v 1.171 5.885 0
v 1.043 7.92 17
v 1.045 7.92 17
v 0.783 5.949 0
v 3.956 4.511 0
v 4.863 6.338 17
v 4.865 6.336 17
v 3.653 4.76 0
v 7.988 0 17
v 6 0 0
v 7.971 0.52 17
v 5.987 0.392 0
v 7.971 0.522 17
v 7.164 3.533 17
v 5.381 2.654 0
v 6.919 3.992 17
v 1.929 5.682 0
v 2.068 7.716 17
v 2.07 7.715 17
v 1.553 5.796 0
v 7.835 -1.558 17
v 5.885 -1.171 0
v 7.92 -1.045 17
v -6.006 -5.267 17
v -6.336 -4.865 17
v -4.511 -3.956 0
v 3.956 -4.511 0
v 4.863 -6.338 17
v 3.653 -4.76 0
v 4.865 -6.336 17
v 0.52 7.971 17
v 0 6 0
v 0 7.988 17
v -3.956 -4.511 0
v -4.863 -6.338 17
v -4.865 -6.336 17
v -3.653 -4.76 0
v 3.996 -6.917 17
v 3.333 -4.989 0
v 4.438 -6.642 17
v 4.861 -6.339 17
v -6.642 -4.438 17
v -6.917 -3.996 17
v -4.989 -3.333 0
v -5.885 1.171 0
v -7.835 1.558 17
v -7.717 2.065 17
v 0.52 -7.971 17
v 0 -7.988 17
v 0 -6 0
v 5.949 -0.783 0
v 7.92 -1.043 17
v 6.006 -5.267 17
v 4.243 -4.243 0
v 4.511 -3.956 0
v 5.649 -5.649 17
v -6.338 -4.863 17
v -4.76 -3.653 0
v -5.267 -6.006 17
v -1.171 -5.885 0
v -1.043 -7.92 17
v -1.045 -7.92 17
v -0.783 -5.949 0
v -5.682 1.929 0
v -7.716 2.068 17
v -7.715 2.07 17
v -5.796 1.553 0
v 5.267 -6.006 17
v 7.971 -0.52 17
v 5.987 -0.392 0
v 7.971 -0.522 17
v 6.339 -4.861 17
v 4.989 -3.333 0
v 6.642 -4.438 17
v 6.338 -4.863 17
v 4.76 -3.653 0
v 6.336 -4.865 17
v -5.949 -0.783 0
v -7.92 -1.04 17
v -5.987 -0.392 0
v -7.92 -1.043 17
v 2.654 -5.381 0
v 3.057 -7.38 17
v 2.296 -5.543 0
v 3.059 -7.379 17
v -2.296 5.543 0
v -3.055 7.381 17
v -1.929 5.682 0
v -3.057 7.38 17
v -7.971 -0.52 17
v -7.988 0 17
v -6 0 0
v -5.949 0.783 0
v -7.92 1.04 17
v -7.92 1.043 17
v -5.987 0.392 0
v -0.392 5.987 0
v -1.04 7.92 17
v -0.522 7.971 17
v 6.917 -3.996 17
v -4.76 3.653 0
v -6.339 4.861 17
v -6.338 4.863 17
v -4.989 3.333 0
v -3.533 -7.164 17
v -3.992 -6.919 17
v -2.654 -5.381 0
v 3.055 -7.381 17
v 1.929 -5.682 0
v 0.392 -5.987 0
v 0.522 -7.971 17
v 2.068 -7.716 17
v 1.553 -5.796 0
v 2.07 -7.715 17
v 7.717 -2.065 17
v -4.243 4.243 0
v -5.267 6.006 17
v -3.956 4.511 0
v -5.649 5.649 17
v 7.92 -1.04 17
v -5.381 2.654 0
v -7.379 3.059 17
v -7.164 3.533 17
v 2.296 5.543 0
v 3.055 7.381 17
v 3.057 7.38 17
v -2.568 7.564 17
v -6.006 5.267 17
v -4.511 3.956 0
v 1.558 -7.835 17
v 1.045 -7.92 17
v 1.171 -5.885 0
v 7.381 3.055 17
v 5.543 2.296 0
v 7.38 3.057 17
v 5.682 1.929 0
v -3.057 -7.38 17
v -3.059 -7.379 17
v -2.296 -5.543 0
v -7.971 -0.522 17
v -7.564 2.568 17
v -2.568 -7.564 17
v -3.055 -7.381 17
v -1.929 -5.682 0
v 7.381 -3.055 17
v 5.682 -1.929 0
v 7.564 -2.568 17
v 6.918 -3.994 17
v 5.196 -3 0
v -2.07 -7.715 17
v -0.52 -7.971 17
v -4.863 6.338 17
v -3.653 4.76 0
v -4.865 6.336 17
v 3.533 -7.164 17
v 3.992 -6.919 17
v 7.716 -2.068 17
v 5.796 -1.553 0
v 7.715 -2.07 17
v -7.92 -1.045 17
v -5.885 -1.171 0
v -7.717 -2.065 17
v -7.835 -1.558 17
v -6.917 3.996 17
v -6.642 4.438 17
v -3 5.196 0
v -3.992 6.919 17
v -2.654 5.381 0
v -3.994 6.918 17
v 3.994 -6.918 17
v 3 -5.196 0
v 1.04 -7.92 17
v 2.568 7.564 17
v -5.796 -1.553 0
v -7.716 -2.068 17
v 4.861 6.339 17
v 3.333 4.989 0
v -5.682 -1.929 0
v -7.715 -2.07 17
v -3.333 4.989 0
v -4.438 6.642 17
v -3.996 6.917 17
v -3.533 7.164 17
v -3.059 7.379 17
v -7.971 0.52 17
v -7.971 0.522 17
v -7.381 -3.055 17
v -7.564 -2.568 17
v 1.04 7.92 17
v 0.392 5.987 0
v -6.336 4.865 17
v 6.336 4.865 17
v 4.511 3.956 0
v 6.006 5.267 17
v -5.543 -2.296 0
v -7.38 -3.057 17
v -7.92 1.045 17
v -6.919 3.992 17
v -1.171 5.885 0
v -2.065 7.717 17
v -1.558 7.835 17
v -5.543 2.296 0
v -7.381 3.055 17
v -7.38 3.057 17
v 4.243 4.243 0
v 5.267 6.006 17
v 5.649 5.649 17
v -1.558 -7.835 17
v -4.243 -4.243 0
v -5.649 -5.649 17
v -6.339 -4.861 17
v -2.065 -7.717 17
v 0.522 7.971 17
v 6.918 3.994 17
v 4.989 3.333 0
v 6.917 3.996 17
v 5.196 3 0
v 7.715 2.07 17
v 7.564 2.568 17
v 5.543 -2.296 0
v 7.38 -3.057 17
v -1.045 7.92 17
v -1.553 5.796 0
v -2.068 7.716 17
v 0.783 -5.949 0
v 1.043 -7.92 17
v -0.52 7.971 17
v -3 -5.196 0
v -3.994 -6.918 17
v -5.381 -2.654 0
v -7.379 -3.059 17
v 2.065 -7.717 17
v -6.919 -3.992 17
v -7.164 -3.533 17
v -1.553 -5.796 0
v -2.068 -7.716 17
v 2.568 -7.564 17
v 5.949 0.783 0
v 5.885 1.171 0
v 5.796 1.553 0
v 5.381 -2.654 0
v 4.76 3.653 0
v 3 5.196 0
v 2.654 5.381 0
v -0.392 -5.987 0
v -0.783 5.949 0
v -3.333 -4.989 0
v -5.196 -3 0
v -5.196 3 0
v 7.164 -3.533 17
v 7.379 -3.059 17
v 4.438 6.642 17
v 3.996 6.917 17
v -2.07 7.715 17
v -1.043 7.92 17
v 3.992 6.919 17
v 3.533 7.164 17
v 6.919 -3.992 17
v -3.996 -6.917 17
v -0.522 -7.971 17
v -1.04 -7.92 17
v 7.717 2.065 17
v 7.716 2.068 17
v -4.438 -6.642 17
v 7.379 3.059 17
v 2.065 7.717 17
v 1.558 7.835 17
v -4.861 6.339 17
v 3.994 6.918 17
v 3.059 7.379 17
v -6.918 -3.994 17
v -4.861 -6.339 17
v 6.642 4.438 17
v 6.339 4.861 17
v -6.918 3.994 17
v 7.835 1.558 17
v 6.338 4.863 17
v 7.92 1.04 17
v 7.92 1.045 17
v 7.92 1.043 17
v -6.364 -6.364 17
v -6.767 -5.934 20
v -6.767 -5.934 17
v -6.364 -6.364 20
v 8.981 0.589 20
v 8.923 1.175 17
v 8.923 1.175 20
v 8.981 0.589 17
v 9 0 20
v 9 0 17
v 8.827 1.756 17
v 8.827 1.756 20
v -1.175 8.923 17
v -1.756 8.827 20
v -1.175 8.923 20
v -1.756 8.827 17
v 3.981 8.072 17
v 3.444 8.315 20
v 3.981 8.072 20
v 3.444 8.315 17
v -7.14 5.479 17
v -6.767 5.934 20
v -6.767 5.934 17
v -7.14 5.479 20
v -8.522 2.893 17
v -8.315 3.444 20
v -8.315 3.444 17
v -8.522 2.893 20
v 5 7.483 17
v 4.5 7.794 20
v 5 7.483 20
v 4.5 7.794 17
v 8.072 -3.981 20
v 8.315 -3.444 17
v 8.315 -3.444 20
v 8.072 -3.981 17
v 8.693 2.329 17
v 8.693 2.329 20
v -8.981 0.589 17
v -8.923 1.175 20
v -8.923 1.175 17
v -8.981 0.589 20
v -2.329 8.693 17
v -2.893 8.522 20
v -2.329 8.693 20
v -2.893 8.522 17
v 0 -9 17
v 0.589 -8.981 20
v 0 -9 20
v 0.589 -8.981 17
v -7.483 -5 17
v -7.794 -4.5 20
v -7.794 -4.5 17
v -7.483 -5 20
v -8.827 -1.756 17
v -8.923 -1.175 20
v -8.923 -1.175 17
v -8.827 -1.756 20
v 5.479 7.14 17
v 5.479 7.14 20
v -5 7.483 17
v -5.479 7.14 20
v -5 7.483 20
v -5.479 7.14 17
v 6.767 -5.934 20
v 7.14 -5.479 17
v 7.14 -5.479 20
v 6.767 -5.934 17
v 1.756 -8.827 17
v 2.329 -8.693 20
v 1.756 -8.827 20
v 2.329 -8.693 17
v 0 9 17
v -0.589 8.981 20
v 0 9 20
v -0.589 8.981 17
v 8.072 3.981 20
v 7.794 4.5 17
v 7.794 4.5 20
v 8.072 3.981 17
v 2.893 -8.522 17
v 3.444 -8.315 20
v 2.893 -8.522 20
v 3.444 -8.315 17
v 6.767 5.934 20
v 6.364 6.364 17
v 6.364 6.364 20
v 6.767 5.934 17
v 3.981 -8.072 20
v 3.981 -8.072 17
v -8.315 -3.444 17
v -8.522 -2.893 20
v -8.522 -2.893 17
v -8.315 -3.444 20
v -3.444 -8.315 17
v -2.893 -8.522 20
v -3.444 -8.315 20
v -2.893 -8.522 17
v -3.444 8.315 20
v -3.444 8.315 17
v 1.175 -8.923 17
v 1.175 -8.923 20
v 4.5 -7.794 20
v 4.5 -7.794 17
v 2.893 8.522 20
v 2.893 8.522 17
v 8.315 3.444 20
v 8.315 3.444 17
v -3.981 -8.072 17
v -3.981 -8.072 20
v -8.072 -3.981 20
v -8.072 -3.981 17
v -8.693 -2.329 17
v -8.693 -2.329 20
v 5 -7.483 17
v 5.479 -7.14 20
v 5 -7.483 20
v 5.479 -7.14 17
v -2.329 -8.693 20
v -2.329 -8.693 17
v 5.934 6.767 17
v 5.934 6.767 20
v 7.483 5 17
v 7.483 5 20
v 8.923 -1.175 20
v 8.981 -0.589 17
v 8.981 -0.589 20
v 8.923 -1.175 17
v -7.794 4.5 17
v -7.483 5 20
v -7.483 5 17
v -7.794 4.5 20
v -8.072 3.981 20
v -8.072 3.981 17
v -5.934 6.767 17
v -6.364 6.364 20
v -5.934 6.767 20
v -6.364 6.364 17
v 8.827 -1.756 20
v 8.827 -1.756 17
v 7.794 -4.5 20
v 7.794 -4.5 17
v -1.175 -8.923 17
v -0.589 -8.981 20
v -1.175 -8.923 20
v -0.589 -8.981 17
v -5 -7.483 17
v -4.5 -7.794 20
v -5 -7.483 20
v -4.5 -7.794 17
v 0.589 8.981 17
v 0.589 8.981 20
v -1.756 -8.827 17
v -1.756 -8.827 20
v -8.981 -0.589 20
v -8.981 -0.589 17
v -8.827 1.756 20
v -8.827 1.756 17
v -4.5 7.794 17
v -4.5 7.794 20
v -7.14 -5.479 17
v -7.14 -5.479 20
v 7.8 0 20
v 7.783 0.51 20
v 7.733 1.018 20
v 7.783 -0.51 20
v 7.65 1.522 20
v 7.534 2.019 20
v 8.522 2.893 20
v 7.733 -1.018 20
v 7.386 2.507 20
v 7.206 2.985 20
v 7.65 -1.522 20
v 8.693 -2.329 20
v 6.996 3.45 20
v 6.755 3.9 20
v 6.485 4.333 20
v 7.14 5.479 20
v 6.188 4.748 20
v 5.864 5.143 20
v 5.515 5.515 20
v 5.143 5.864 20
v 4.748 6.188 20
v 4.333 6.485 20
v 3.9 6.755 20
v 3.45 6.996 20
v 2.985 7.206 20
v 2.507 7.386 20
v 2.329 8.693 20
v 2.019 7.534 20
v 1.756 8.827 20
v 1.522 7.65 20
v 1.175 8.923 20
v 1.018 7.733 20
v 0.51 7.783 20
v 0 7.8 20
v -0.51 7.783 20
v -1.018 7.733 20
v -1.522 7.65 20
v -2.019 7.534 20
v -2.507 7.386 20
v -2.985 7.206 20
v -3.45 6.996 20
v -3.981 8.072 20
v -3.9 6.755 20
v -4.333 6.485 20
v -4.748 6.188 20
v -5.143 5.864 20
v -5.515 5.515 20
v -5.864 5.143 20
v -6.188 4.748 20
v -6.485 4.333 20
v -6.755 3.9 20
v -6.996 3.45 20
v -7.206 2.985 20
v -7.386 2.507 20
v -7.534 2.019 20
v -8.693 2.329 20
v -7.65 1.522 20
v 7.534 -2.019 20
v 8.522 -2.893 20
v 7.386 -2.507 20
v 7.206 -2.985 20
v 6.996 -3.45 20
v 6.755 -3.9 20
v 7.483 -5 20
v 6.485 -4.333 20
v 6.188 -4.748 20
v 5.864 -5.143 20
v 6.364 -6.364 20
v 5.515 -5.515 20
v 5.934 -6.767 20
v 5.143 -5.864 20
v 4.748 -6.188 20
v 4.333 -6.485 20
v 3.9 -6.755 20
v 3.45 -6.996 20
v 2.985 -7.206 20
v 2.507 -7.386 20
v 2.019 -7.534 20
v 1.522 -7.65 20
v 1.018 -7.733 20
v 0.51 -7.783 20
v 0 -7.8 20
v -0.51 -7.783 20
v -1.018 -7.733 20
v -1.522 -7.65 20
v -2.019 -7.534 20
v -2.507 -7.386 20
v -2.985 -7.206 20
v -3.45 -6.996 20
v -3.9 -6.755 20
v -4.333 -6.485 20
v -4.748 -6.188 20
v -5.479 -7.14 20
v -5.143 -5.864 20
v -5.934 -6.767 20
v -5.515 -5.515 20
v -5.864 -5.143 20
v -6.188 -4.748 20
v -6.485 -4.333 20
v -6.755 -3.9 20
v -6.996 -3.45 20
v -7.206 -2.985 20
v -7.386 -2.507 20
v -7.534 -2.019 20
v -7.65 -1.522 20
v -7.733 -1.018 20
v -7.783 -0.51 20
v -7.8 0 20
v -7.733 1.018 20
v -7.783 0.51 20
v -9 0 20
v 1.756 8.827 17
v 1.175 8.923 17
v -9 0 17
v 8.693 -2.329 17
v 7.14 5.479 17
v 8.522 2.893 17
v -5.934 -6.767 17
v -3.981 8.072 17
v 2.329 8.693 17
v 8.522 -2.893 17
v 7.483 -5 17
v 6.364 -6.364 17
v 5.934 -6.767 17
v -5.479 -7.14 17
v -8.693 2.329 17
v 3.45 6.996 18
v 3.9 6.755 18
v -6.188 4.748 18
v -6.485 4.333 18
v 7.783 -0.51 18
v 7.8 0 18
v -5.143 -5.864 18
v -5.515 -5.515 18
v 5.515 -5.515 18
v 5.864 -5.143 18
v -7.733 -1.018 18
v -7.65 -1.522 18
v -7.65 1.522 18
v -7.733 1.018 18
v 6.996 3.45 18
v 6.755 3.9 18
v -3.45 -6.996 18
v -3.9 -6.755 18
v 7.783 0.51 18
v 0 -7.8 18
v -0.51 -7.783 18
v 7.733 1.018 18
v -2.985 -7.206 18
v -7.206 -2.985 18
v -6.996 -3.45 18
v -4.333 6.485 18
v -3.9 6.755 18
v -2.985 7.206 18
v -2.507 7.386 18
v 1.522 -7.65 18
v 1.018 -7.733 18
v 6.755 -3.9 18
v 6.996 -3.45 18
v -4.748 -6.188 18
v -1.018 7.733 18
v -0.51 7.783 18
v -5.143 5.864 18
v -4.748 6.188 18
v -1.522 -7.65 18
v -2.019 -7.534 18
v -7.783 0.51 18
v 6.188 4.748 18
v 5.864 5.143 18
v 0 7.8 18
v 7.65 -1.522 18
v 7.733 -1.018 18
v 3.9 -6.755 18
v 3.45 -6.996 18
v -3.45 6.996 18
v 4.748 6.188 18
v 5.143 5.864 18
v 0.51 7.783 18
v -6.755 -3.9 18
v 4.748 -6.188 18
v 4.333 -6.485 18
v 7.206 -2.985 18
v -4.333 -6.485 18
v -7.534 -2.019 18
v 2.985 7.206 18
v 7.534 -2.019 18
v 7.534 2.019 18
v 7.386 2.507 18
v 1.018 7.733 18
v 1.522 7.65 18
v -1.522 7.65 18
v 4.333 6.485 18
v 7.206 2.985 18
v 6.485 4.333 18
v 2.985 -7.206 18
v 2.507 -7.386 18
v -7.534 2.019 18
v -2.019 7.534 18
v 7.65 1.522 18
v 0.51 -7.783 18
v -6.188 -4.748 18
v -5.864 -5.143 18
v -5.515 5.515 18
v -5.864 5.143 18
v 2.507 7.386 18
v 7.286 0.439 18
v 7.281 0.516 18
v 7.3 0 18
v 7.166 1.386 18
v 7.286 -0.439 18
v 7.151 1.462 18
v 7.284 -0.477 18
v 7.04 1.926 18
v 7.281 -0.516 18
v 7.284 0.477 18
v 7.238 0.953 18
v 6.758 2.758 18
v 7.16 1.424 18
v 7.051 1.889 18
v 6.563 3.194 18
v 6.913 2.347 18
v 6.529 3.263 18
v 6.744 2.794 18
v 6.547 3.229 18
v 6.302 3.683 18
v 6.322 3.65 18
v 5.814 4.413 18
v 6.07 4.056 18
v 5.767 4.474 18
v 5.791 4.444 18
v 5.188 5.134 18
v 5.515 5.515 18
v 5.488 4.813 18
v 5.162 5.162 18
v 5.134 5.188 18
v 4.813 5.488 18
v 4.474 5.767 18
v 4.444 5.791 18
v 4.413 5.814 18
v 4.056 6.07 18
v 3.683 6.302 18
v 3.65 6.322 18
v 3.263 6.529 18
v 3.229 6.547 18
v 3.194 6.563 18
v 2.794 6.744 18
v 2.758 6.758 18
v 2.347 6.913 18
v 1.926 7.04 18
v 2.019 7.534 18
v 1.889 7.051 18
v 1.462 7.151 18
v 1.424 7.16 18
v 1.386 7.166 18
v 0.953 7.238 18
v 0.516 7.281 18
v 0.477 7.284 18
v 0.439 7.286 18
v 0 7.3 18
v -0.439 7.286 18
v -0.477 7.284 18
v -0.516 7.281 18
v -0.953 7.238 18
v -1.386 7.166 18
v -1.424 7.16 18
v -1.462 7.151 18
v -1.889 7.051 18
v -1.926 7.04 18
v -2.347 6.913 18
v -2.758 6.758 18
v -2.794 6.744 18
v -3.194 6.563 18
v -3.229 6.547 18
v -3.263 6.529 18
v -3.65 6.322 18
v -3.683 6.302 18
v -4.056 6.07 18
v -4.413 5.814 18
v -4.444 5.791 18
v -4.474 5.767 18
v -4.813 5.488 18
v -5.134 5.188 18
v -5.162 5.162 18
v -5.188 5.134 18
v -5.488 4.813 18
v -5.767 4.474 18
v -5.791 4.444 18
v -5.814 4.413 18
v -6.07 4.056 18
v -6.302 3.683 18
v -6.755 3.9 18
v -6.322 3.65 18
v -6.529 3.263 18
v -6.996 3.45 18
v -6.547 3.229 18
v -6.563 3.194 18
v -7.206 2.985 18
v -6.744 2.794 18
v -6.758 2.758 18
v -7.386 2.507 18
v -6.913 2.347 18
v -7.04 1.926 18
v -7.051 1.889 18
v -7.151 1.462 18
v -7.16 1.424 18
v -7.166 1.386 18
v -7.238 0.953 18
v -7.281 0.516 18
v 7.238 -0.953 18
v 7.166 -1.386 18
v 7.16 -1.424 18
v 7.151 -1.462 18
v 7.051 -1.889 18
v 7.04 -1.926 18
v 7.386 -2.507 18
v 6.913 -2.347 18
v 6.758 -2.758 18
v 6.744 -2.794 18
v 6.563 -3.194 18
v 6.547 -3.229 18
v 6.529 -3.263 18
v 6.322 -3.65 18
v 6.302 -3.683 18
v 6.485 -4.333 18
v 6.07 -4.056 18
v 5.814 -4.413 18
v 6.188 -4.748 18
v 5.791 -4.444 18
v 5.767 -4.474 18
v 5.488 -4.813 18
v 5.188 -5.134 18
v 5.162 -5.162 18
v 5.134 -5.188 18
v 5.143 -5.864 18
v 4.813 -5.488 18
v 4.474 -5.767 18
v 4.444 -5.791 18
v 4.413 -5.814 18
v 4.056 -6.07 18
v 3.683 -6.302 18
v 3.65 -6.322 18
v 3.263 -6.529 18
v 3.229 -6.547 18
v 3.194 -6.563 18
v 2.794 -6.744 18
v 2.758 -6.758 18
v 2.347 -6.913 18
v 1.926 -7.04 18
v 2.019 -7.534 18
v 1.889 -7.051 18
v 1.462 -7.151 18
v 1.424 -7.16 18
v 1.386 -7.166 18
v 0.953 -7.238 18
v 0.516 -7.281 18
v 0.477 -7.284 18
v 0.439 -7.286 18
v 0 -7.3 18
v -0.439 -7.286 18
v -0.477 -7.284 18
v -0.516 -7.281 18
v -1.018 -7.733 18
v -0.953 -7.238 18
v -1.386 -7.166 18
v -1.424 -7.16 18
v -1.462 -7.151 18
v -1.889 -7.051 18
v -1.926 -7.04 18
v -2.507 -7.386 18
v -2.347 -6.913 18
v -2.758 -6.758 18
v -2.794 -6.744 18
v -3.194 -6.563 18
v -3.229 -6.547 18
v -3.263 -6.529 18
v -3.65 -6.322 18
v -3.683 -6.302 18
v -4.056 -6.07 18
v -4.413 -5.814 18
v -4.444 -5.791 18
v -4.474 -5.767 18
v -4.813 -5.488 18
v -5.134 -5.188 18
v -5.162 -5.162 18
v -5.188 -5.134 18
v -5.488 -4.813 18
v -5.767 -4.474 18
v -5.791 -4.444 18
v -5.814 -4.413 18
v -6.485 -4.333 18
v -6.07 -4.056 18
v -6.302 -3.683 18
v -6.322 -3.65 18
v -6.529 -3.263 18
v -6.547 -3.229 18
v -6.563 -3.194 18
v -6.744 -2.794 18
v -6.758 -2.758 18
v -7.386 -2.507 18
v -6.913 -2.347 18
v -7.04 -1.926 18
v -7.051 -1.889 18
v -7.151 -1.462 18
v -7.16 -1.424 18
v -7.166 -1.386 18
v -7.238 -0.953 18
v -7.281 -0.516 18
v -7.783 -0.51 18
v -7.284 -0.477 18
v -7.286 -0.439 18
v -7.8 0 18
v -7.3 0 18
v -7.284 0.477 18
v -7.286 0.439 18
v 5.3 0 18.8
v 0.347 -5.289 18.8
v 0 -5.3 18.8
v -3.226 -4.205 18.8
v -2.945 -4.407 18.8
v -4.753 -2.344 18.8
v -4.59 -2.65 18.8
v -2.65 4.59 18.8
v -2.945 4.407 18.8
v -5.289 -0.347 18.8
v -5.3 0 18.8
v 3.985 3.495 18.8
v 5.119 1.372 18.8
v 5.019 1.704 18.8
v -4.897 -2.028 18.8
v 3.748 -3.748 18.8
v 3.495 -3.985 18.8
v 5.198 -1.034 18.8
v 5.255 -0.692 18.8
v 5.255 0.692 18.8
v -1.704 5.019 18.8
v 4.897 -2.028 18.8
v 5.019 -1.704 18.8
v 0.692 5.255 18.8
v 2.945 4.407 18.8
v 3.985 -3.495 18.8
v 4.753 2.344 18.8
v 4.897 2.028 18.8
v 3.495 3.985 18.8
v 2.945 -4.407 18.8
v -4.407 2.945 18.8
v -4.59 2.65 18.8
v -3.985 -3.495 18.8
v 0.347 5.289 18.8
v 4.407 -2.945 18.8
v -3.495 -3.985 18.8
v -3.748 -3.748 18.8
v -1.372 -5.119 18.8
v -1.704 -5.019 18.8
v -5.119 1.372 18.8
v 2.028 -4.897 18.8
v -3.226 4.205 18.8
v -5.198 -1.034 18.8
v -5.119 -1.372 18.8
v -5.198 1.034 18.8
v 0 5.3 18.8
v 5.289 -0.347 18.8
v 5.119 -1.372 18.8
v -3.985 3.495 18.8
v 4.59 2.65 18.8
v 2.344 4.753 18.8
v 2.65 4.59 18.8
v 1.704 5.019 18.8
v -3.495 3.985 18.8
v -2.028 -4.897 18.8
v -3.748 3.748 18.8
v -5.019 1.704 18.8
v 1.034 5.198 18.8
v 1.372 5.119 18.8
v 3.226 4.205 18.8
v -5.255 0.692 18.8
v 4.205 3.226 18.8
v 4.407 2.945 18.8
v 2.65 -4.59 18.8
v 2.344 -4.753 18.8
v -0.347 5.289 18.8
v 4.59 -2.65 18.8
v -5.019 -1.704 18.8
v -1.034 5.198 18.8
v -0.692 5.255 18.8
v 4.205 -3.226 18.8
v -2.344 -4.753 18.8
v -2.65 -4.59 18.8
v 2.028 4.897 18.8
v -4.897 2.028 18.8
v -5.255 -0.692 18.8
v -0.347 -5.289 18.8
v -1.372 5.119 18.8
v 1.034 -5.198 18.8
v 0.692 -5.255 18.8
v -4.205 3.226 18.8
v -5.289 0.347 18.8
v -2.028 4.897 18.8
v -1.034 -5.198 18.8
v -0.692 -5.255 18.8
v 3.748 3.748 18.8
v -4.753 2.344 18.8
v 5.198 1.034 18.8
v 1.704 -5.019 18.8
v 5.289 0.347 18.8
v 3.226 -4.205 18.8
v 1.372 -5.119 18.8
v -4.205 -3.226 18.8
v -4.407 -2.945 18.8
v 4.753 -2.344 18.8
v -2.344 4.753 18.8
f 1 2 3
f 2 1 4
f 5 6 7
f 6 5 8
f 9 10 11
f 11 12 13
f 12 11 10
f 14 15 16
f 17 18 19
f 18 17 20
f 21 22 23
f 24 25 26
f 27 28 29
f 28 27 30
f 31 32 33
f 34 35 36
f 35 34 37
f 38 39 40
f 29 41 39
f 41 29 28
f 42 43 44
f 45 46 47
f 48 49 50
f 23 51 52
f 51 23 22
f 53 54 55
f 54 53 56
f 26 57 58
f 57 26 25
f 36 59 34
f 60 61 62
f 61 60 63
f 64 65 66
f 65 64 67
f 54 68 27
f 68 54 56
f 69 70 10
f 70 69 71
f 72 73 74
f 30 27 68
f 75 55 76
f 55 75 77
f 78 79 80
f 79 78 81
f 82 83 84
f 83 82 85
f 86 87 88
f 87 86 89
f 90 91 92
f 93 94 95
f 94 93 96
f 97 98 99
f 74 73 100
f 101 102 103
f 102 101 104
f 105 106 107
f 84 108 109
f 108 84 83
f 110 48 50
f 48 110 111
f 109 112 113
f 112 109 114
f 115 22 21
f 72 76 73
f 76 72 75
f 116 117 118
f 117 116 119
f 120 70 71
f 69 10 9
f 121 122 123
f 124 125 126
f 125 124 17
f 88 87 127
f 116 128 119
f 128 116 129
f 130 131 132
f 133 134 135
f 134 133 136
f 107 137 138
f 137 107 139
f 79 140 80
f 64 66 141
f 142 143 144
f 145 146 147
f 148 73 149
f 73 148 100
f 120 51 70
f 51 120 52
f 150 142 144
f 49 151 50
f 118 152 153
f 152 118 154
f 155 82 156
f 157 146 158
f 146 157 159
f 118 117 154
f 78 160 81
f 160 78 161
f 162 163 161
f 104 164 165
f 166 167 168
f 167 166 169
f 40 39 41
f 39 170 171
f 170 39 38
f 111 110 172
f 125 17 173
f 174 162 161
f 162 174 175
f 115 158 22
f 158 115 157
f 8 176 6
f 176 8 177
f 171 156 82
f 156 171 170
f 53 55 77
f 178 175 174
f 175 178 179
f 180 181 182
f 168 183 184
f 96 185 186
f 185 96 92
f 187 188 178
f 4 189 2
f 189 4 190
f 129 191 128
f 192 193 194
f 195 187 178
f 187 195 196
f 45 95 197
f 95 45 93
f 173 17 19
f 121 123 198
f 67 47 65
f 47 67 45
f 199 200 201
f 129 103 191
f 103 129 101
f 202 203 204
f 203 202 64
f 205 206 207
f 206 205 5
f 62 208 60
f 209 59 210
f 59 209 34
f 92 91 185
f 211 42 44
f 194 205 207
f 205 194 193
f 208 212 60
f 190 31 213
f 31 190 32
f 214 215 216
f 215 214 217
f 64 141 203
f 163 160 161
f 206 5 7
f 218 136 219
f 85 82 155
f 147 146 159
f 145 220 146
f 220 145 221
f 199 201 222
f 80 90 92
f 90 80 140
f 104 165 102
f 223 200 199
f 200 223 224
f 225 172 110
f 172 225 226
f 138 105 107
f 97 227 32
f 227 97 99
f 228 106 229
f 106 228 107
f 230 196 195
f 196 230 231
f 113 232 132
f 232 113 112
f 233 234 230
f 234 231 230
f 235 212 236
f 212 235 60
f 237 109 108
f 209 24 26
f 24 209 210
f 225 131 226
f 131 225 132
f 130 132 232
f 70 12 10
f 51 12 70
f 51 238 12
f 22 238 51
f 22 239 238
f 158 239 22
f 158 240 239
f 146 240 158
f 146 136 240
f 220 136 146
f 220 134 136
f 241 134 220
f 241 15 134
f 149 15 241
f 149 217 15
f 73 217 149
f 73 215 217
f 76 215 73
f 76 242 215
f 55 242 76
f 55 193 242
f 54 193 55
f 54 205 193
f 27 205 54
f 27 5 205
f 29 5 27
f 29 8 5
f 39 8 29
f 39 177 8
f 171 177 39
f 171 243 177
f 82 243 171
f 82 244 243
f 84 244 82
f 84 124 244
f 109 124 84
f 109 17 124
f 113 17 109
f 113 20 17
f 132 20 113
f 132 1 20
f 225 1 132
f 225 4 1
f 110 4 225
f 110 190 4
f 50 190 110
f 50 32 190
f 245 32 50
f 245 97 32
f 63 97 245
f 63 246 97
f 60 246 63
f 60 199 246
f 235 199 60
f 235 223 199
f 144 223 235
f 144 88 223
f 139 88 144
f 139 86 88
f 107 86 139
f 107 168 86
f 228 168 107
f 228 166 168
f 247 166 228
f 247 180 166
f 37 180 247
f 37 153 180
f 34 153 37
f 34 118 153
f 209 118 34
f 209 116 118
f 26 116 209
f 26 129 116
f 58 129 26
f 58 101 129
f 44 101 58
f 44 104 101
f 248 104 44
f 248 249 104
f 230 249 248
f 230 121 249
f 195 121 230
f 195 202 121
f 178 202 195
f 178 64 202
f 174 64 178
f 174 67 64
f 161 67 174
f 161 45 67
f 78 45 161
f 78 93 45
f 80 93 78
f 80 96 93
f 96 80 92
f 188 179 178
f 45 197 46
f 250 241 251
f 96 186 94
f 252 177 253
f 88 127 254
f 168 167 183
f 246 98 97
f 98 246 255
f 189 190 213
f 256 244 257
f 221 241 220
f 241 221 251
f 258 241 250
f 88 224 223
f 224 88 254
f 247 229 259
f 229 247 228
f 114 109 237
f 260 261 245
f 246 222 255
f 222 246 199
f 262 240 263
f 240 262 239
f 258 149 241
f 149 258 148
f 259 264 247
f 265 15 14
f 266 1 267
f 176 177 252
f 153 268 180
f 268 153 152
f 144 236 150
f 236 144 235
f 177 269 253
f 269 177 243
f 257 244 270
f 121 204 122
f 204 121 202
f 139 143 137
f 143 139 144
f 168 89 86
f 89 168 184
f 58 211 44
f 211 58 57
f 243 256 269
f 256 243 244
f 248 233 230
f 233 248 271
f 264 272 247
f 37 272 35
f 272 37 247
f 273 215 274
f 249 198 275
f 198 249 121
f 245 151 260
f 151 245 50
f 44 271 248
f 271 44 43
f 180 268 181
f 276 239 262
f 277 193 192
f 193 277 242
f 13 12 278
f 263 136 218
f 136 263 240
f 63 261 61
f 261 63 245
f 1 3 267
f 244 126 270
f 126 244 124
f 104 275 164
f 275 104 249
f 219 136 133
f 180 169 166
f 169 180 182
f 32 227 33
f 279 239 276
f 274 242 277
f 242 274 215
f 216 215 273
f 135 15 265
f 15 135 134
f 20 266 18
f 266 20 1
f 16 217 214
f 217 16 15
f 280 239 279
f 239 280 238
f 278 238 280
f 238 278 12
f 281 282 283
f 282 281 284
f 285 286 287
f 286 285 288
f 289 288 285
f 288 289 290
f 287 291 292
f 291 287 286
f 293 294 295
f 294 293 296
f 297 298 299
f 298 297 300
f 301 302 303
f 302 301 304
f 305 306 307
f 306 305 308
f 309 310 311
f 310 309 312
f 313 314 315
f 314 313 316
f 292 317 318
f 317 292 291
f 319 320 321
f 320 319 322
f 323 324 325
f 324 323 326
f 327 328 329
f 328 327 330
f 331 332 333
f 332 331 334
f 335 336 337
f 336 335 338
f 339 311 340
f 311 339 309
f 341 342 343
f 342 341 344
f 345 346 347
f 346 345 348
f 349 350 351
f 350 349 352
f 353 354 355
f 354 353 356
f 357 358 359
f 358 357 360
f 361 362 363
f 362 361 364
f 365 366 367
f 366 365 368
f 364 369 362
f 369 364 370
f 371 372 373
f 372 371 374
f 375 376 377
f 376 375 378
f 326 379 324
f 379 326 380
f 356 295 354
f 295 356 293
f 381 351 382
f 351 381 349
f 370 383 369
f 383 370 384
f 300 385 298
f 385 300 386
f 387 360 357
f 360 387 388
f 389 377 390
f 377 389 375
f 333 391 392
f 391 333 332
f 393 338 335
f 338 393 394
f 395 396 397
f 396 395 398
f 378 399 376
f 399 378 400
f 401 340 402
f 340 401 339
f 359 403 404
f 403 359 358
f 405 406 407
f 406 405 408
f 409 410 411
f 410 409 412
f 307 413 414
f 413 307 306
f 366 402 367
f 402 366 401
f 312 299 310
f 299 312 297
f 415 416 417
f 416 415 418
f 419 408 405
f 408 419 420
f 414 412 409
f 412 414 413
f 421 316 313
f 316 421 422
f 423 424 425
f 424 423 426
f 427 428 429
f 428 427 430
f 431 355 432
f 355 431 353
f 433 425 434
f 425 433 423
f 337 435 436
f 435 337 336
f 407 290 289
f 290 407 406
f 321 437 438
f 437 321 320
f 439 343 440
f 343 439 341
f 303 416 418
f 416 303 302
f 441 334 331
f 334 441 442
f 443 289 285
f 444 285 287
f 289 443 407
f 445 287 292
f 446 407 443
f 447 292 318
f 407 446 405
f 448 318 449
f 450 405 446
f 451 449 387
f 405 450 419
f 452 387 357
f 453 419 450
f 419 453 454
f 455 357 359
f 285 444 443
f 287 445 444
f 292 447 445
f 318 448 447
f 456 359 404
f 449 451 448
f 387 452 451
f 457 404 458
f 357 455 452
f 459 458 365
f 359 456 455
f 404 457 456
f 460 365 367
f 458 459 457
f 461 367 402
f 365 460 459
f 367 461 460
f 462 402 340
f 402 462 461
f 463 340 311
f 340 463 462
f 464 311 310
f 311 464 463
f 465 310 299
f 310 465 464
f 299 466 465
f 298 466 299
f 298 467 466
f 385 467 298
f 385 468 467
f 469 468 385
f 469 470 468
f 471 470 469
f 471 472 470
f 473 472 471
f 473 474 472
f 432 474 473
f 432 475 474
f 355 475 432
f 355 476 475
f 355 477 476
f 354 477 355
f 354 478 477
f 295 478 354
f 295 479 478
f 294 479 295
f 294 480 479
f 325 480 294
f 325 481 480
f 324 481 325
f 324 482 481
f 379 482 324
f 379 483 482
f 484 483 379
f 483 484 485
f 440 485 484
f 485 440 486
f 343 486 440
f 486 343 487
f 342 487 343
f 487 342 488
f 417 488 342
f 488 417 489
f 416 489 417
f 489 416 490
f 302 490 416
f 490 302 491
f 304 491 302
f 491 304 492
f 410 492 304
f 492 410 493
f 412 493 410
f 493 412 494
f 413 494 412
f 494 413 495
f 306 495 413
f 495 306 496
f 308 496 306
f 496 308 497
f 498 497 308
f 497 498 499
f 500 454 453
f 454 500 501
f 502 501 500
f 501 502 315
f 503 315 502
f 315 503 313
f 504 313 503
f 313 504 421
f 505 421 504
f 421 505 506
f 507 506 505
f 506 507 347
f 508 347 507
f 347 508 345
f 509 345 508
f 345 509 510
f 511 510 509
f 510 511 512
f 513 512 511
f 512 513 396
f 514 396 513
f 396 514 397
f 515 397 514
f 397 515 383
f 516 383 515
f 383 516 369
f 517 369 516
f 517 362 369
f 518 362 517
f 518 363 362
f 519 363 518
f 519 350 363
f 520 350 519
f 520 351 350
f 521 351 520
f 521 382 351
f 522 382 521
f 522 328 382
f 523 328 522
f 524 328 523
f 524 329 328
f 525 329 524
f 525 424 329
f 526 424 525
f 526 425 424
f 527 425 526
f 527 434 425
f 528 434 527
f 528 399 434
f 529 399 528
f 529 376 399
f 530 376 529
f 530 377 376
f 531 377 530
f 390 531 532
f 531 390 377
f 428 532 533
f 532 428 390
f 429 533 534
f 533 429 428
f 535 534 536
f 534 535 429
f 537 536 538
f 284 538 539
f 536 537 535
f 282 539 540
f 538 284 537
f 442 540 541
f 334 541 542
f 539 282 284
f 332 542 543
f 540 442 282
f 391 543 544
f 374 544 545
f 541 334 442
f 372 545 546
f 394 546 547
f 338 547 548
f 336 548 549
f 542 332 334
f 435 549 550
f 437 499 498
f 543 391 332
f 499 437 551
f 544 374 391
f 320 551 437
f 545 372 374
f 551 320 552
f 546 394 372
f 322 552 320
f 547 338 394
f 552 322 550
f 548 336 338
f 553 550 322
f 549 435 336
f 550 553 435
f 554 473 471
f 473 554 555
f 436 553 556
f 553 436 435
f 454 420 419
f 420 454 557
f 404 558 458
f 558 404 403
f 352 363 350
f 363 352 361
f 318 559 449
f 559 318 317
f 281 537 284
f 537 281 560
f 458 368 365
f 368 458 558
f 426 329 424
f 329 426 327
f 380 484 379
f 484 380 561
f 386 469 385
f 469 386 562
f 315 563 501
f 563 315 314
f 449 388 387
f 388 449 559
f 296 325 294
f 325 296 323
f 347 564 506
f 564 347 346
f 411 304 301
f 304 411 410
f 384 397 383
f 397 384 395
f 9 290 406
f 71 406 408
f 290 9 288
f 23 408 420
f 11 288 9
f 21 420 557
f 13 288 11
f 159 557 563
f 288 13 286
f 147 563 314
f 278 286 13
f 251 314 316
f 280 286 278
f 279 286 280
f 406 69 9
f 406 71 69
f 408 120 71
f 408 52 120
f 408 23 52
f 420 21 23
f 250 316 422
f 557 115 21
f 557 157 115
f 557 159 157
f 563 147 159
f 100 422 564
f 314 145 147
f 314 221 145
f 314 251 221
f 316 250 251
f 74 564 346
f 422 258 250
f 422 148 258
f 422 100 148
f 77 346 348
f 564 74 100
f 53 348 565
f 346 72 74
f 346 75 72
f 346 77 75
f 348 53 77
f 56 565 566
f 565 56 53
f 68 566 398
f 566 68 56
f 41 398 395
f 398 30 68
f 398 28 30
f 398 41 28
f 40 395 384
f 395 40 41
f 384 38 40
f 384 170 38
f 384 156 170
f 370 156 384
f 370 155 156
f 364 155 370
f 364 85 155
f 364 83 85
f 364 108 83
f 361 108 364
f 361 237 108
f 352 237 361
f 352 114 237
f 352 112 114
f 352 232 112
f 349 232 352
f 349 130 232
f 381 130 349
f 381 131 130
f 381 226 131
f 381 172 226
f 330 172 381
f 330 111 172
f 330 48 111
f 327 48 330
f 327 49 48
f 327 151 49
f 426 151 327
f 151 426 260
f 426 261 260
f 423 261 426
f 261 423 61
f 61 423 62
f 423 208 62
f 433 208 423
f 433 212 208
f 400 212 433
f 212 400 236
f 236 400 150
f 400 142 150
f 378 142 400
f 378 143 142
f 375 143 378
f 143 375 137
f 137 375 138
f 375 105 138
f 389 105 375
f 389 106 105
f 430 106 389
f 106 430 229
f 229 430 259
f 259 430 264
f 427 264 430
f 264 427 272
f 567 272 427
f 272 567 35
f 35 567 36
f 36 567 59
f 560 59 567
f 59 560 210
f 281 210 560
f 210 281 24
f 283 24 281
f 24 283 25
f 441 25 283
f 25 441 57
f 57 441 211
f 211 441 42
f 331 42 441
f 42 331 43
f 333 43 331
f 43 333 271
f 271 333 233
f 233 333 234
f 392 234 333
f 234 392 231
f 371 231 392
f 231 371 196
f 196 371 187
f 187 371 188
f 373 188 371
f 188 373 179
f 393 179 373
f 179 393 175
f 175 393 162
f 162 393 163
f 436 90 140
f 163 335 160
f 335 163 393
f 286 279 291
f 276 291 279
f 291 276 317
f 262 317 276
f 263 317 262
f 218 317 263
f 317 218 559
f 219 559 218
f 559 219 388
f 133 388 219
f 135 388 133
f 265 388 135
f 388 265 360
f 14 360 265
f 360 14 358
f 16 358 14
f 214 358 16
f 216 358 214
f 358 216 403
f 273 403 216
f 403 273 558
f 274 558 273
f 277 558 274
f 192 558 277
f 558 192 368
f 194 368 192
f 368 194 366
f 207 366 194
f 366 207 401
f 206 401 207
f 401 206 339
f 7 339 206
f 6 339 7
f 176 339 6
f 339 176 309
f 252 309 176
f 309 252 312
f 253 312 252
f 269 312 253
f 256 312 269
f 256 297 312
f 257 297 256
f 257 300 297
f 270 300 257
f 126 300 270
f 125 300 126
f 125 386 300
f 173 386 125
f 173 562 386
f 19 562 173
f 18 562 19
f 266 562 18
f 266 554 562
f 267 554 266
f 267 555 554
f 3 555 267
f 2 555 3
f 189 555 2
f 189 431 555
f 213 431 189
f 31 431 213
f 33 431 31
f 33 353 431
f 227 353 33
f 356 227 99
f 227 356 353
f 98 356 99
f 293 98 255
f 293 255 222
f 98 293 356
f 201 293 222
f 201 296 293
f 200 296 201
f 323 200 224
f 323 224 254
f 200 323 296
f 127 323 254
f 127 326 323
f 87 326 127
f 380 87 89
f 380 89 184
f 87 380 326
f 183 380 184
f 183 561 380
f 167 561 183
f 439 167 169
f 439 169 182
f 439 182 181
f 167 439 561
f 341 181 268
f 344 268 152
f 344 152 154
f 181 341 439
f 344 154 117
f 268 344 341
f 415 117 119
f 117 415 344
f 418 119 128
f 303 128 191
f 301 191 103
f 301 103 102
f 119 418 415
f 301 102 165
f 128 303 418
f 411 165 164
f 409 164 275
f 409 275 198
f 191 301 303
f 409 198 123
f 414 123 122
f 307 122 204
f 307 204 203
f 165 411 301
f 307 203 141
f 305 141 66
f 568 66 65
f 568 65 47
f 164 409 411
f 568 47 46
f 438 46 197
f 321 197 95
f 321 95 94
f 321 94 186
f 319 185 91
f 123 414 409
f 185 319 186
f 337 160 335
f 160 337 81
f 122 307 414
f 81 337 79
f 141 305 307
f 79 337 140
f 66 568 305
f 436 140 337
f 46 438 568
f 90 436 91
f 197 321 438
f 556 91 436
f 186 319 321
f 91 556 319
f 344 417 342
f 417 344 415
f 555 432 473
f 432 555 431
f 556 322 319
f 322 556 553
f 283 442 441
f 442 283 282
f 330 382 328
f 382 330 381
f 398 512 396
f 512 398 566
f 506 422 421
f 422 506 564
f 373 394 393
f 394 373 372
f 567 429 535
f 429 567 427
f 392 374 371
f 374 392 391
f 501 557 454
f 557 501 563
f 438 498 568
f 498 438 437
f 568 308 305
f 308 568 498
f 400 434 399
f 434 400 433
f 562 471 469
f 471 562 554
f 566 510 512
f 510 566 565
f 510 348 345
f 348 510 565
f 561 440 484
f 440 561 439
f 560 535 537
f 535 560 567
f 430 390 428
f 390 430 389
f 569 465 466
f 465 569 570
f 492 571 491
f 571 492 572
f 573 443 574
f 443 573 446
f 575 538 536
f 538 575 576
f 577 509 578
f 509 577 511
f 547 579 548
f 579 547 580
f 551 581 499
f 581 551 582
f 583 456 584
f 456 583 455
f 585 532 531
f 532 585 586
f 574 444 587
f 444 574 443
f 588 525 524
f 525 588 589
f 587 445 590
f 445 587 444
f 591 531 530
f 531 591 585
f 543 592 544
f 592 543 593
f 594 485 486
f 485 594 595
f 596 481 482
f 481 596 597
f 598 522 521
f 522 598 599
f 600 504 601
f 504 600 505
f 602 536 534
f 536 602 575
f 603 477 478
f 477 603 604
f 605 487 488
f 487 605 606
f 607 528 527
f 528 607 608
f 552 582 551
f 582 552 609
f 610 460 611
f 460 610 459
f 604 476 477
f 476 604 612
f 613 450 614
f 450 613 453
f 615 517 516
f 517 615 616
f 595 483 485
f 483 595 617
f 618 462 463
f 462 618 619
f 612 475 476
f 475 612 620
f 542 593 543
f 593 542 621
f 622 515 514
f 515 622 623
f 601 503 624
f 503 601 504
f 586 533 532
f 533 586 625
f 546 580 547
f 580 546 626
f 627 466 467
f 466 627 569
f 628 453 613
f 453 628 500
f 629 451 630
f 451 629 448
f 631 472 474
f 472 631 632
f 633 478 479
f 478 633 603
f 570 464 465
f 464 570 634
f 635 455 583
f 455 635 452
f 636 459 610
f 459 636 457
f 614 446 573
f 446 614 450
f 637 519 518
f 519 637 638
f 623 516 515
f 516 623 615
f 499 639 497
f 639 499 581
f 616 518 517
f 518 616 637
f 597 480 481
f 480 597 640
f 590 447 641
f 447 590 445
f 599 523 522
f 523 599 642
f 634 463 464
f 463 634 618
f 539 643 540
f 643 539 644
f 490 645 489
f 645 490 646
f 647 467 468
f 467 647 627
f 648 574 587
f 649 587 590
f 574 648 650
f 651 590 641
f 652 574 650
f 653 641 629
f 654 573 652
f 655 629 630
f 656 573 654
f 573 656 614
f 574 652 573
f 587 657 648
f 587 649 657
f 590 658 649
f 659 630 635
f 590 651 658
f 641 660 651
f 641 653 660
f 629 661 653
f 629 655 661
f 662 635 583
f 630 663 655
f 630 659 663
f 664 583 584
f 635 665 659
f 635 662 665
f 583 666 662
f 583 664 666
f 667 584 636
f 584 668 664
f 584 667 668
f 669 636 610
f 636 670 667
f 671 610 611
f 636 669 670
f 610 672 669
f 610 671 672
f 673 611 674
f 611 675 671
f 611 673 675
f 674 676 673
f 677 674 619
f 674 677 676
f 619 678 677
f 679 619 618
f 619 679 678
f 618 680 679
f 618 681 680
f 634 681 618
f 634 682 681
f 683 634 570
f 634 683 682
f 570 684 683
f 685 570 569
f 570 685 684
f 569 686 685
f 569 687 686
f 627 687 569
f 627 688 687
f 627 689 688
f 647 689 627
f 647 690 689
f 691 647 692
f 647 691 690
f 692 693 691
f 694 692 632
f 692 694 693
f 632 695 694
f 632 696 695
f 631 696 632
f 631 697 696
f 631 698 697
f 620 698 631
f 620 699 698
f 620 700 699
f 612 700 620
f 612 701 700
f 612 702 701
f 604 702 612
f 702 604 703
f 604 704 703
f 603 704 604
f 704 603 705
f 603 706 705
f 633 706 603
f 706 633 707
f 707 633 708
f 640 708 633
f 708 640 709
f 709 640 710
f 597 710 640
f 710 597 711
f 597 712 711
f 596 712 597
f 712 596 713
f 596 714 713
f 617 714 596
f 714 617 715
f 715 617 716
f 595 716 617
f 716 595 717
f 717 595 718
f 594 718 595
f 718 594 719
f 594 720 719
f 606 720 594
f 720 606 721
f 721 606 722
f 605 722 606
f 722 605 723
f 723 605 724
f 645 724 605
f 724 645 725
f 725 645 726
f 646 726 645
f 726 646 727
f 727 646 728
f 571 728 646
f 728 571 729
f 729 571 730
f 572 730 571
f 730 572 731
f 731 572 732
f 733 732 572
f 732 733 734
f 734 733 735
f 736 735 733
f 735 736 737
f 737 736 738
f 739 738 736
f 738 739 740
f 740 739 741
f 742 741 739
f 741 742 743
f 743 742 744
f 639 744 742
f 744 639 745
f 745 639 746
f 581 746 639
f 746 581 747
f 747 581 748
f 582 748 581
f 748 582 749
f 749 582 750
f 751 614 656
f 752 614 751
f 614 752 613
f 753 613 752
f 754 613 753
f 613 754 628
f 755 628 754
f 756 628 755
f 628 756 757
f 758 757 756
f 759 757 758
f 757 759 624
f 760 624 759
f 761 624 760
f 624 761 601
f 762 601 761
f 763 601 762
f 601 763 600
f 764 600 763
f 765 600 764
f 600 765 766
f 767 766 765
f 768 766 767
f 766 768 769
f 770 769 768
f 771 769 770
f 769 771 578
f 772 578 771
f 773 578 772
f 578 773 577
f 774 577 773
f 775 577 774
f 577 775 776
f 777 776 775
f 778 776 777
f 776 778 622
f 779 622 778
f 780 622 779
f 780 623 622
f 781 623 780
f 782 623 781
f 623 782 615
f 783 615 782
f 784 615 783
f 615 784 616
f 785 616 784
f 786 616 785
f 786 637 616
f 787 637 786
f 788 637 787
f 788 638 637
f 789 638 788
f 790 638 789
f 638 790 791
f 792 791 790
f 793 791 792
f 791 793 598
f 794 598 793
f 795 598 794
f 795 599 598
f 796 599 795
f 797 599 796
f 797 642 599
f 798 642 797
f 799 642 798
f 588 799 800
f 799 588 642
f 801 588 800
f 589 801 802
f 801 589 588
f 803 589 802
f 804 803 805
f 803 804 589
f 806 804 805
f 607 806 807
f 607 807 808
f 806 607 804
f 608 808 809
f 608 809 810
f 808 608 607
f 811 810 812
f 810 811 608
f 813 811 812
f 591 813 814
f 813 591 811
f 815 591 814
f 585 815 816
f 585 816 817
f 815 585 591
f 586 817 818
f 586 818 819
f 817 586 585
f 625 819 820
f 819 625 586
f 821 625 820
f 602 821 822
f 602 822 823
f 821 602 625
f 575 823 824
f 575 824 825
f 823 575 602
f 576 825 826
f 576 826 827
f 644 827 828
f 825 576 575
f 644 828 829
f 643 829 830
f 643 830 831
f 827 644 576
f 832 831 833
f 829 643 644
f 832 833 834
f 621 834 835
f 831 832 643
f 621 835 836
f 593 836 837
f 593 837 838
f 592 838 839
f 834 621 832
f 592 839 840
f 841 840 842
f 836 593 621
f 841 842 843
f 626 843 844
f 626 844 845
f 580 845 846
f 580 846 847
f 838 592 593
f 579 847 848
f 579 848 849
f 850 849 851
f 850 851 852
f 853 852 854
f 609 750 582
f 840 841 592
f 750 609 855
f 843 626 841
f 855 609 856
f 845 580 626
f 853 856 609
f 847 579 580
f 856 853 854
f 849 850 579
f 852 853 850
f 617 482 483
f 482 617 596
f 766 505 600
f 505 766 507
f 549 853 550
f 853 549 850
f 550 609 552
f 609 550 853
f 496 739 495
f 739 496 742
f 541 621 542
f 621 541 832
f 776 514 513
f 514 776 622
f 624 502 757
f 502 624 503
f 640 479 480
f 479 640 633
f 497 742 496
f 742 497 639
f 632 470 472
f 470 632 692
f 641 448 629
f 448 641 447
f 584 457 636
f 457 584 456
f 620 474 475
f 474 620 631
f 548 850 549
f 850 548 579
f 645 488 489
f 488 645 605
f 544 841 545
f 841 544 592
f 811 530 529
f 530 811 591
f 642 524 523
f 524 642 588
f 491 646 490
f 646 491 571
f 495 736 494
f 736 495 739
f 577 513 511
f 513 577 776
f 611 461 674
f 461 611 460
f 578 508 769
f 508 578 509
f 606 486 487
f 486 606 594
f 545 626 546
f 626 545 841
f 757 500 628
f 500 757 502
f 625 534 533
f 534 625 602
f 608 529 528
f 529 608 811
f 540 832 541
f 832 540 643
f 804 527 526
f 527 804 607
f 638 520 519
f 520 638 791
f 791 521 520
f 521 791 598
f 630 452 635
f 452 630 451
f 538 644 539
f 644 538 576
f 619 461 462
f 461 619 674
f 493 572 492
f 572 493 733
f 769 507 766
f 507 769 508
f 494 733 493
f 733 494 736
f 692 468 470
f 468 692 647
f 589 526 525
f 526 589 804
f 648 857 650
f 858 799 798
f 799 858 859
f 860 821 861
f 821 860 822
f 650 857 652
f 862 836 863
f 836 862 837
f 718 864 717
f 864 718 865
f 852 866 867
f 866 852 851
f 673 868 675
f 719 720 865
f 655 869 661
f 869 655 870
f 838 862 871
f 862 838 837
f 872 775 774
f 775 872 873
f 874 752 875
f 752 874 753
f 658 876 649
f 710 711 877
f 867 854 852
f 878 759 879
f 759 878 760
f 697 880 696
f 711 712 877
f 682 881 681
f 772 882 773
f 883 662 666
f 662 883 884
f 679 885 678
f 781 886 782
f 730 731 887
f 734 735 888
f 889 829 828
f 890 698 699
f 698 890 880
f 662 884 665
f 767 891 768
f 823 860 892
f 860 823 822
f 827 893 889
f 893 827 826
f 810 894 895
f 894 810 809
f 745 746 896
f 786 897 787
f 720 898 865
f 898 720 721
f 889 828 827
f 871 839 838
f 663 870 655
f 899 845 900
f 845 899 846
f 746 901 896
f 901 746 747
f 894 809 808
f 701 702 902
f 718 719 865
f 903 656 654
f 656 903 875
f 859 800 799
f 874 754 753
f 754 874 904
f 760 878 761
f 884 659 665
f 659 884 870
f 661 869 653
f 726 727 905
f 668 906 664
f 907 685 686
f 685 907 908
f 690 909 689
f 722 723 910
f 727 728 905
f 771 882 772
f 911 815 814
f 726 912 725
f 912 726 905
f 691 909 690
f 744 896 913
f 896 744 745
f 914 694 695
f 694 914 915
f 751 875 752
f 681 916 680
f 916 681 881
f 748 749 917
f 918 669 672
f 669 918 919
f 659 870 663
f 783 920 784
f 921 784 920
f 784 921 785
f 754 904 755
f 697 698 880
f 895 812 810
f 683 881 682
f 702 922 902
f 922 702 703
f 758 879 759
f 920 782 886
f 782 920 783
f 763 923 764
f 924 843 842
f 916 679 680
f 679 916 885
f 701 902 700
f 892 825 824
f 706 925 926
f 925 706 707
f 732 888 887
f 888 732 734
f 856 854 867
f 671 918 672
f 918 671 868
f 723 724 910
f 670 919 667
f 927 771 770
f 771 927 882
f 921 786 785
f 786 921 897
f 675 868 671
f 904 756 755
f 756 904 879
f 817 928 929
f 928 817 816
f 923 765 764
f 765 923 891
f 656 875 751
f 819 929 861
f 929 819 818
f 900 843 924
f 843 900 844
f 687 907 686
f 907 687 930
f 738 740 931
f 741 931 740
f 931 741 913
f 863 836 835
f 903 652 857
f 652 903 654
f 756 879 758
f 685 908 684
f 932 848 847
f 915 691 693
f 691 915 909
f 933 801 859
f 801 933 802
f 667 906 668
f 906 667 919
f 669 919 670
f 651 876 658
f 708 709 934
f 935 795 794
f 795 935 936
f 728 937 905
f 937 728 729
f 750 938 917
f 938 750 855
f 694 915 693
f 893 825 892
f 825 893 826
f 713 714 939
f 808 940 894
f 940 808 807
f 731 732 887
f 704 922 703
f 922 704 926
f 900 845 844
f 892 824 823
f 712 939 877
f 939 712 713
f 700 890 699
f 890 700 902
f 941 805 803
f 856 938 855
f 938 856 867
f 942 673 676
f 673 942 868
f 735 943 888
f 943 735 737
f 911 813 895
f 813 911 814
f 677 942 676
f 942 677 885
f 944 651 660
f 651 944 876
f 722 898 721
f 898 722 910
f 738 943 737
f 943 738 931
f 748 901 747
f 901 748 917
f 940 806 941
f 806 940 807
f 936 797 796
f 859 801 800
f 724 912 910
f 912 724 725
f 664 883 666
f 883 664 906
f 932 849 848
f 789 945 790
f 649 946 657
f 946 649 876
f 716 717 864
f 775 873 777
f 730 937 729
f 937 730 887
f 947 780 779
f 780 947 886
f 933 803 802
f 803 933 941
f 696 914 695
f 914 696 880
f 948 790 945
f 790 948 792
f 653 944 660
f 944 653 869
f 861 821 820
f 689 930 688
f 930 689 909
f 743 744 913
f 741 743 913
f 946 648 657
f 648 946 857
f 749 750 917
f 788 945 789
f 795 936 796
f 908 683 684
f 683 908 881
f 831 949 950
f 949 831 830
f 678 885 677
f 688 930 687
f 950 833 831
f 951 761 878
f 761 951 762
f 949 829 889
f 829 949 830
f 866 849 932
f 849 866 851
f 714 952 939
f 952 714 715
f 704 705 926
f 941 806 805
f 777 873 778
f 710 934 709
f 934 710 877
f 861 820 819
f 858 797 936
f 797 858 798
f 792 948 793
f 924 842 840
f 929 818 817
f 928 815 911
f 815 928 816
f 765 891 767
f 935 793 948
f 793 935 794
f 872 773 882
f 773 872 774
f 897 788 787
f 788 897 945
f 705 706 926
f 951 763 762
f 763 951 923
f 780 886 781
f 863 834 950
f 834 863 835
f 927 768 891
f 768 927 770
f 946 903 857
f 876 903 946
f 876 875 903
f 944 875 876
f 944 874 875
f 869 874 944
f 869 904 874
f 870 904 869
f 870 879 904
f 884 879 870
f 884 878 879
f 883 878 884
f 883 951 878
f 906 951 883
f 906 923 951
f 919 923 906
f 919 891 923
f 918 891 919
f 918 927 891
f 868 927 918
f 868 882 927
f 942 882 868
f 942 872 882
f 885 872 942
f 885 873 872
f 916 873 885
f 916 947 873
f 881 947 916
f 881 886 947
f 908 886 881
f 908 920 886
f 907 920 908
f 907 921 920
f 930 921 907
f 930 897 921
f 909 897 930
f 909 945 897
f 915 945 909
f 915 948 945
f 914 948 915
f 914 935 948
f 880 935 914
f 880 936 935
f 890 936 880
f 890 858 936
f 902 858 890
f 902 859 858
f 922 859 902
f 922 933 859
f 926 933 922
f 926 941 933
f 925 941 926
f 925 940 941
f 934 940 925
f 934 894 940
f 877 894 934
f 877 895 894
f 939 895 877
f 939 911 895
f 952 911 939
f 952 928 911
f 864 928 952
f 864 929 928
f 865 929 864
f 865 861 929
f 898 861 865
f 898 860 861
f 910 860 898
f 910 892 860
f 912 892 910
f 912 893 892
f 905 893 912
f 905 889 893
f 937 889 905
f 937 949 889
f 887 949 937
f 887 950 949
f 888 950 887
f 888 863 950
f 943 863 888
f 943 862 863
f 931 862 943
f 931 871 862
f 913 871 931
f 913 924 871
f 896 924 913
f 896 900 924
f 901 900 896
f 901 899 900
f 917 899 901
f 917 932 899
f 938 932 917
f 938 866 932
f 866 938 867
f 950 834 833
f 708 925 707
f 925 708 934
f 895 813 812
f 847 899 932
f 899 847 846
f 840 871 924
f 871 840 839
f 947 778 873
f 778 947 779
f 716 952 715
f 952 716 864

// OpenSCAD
// Vasinho de plantas para maquete
// Orientacao de impressao: base plana na mesa (z = 0), sem suporte.
// Todas as medidas em mm. E = estimada (escala da maquete nao informada).

// ---------- Parametros ----------
altura        = 20;   // altura total do vaso (E)
diam_boca     = 18;   // diametro externo do aro superior (E)
diam_base     = 12;   // diametro externo da base (E)
altura_borda  = 3;    // altura do aro da borda (E)
folga_borda   = 1;    // quanto o aro sobressai alem da parede (E)
parede        = 1.2;  // espessura da parede do aro (multiplo de 0,4)
profund_terra = 2;    // distancia da terra ate o topo do aro
altura_monte  = 0.8;  // altura do montinho de terra
OV            = 0.1;  // sobreposicao entre partes (solido unico)
$fn           = 96;   // resolucao das curvas

// ---------- Modulos ----------

// Corpo conico do vaso (sem a borda)
module corpo() {
    cylinder(h = altura - altura_borda + OV,
             d1 = diam_base, d2 = diam_boca - 2 * folga_borda);
}

// Aro da borda no topo
module borda() {
    translate([0, 0, altura - altura_borda])
        cylinder(h = altura_borda, d = diam_boca);
}

// Rebaixo raso no topo onde fica a terra (base fica maciça: sem pontes)
module rebaixo() {
    translate([0, 0, altura - profund_terra])
        cylinder(h = profund_terra + 1, d = diam_boca - 2 * parede);
}

// Montinho de terra sobre o fundo do rebaixo
module monte() {
    d = diam_boca - 2 * parede;
    translate([0, 0, altura - profund_terra - OV])
        cylinder(h = altura_monte + OV, d1 = d - 0.5, d2 = d - 5);
}

// ---------- Peca ----------
union() {
    difference() {
        union() { corpo(); borda(); }
        rebaixo();
    }
    monte();
}
